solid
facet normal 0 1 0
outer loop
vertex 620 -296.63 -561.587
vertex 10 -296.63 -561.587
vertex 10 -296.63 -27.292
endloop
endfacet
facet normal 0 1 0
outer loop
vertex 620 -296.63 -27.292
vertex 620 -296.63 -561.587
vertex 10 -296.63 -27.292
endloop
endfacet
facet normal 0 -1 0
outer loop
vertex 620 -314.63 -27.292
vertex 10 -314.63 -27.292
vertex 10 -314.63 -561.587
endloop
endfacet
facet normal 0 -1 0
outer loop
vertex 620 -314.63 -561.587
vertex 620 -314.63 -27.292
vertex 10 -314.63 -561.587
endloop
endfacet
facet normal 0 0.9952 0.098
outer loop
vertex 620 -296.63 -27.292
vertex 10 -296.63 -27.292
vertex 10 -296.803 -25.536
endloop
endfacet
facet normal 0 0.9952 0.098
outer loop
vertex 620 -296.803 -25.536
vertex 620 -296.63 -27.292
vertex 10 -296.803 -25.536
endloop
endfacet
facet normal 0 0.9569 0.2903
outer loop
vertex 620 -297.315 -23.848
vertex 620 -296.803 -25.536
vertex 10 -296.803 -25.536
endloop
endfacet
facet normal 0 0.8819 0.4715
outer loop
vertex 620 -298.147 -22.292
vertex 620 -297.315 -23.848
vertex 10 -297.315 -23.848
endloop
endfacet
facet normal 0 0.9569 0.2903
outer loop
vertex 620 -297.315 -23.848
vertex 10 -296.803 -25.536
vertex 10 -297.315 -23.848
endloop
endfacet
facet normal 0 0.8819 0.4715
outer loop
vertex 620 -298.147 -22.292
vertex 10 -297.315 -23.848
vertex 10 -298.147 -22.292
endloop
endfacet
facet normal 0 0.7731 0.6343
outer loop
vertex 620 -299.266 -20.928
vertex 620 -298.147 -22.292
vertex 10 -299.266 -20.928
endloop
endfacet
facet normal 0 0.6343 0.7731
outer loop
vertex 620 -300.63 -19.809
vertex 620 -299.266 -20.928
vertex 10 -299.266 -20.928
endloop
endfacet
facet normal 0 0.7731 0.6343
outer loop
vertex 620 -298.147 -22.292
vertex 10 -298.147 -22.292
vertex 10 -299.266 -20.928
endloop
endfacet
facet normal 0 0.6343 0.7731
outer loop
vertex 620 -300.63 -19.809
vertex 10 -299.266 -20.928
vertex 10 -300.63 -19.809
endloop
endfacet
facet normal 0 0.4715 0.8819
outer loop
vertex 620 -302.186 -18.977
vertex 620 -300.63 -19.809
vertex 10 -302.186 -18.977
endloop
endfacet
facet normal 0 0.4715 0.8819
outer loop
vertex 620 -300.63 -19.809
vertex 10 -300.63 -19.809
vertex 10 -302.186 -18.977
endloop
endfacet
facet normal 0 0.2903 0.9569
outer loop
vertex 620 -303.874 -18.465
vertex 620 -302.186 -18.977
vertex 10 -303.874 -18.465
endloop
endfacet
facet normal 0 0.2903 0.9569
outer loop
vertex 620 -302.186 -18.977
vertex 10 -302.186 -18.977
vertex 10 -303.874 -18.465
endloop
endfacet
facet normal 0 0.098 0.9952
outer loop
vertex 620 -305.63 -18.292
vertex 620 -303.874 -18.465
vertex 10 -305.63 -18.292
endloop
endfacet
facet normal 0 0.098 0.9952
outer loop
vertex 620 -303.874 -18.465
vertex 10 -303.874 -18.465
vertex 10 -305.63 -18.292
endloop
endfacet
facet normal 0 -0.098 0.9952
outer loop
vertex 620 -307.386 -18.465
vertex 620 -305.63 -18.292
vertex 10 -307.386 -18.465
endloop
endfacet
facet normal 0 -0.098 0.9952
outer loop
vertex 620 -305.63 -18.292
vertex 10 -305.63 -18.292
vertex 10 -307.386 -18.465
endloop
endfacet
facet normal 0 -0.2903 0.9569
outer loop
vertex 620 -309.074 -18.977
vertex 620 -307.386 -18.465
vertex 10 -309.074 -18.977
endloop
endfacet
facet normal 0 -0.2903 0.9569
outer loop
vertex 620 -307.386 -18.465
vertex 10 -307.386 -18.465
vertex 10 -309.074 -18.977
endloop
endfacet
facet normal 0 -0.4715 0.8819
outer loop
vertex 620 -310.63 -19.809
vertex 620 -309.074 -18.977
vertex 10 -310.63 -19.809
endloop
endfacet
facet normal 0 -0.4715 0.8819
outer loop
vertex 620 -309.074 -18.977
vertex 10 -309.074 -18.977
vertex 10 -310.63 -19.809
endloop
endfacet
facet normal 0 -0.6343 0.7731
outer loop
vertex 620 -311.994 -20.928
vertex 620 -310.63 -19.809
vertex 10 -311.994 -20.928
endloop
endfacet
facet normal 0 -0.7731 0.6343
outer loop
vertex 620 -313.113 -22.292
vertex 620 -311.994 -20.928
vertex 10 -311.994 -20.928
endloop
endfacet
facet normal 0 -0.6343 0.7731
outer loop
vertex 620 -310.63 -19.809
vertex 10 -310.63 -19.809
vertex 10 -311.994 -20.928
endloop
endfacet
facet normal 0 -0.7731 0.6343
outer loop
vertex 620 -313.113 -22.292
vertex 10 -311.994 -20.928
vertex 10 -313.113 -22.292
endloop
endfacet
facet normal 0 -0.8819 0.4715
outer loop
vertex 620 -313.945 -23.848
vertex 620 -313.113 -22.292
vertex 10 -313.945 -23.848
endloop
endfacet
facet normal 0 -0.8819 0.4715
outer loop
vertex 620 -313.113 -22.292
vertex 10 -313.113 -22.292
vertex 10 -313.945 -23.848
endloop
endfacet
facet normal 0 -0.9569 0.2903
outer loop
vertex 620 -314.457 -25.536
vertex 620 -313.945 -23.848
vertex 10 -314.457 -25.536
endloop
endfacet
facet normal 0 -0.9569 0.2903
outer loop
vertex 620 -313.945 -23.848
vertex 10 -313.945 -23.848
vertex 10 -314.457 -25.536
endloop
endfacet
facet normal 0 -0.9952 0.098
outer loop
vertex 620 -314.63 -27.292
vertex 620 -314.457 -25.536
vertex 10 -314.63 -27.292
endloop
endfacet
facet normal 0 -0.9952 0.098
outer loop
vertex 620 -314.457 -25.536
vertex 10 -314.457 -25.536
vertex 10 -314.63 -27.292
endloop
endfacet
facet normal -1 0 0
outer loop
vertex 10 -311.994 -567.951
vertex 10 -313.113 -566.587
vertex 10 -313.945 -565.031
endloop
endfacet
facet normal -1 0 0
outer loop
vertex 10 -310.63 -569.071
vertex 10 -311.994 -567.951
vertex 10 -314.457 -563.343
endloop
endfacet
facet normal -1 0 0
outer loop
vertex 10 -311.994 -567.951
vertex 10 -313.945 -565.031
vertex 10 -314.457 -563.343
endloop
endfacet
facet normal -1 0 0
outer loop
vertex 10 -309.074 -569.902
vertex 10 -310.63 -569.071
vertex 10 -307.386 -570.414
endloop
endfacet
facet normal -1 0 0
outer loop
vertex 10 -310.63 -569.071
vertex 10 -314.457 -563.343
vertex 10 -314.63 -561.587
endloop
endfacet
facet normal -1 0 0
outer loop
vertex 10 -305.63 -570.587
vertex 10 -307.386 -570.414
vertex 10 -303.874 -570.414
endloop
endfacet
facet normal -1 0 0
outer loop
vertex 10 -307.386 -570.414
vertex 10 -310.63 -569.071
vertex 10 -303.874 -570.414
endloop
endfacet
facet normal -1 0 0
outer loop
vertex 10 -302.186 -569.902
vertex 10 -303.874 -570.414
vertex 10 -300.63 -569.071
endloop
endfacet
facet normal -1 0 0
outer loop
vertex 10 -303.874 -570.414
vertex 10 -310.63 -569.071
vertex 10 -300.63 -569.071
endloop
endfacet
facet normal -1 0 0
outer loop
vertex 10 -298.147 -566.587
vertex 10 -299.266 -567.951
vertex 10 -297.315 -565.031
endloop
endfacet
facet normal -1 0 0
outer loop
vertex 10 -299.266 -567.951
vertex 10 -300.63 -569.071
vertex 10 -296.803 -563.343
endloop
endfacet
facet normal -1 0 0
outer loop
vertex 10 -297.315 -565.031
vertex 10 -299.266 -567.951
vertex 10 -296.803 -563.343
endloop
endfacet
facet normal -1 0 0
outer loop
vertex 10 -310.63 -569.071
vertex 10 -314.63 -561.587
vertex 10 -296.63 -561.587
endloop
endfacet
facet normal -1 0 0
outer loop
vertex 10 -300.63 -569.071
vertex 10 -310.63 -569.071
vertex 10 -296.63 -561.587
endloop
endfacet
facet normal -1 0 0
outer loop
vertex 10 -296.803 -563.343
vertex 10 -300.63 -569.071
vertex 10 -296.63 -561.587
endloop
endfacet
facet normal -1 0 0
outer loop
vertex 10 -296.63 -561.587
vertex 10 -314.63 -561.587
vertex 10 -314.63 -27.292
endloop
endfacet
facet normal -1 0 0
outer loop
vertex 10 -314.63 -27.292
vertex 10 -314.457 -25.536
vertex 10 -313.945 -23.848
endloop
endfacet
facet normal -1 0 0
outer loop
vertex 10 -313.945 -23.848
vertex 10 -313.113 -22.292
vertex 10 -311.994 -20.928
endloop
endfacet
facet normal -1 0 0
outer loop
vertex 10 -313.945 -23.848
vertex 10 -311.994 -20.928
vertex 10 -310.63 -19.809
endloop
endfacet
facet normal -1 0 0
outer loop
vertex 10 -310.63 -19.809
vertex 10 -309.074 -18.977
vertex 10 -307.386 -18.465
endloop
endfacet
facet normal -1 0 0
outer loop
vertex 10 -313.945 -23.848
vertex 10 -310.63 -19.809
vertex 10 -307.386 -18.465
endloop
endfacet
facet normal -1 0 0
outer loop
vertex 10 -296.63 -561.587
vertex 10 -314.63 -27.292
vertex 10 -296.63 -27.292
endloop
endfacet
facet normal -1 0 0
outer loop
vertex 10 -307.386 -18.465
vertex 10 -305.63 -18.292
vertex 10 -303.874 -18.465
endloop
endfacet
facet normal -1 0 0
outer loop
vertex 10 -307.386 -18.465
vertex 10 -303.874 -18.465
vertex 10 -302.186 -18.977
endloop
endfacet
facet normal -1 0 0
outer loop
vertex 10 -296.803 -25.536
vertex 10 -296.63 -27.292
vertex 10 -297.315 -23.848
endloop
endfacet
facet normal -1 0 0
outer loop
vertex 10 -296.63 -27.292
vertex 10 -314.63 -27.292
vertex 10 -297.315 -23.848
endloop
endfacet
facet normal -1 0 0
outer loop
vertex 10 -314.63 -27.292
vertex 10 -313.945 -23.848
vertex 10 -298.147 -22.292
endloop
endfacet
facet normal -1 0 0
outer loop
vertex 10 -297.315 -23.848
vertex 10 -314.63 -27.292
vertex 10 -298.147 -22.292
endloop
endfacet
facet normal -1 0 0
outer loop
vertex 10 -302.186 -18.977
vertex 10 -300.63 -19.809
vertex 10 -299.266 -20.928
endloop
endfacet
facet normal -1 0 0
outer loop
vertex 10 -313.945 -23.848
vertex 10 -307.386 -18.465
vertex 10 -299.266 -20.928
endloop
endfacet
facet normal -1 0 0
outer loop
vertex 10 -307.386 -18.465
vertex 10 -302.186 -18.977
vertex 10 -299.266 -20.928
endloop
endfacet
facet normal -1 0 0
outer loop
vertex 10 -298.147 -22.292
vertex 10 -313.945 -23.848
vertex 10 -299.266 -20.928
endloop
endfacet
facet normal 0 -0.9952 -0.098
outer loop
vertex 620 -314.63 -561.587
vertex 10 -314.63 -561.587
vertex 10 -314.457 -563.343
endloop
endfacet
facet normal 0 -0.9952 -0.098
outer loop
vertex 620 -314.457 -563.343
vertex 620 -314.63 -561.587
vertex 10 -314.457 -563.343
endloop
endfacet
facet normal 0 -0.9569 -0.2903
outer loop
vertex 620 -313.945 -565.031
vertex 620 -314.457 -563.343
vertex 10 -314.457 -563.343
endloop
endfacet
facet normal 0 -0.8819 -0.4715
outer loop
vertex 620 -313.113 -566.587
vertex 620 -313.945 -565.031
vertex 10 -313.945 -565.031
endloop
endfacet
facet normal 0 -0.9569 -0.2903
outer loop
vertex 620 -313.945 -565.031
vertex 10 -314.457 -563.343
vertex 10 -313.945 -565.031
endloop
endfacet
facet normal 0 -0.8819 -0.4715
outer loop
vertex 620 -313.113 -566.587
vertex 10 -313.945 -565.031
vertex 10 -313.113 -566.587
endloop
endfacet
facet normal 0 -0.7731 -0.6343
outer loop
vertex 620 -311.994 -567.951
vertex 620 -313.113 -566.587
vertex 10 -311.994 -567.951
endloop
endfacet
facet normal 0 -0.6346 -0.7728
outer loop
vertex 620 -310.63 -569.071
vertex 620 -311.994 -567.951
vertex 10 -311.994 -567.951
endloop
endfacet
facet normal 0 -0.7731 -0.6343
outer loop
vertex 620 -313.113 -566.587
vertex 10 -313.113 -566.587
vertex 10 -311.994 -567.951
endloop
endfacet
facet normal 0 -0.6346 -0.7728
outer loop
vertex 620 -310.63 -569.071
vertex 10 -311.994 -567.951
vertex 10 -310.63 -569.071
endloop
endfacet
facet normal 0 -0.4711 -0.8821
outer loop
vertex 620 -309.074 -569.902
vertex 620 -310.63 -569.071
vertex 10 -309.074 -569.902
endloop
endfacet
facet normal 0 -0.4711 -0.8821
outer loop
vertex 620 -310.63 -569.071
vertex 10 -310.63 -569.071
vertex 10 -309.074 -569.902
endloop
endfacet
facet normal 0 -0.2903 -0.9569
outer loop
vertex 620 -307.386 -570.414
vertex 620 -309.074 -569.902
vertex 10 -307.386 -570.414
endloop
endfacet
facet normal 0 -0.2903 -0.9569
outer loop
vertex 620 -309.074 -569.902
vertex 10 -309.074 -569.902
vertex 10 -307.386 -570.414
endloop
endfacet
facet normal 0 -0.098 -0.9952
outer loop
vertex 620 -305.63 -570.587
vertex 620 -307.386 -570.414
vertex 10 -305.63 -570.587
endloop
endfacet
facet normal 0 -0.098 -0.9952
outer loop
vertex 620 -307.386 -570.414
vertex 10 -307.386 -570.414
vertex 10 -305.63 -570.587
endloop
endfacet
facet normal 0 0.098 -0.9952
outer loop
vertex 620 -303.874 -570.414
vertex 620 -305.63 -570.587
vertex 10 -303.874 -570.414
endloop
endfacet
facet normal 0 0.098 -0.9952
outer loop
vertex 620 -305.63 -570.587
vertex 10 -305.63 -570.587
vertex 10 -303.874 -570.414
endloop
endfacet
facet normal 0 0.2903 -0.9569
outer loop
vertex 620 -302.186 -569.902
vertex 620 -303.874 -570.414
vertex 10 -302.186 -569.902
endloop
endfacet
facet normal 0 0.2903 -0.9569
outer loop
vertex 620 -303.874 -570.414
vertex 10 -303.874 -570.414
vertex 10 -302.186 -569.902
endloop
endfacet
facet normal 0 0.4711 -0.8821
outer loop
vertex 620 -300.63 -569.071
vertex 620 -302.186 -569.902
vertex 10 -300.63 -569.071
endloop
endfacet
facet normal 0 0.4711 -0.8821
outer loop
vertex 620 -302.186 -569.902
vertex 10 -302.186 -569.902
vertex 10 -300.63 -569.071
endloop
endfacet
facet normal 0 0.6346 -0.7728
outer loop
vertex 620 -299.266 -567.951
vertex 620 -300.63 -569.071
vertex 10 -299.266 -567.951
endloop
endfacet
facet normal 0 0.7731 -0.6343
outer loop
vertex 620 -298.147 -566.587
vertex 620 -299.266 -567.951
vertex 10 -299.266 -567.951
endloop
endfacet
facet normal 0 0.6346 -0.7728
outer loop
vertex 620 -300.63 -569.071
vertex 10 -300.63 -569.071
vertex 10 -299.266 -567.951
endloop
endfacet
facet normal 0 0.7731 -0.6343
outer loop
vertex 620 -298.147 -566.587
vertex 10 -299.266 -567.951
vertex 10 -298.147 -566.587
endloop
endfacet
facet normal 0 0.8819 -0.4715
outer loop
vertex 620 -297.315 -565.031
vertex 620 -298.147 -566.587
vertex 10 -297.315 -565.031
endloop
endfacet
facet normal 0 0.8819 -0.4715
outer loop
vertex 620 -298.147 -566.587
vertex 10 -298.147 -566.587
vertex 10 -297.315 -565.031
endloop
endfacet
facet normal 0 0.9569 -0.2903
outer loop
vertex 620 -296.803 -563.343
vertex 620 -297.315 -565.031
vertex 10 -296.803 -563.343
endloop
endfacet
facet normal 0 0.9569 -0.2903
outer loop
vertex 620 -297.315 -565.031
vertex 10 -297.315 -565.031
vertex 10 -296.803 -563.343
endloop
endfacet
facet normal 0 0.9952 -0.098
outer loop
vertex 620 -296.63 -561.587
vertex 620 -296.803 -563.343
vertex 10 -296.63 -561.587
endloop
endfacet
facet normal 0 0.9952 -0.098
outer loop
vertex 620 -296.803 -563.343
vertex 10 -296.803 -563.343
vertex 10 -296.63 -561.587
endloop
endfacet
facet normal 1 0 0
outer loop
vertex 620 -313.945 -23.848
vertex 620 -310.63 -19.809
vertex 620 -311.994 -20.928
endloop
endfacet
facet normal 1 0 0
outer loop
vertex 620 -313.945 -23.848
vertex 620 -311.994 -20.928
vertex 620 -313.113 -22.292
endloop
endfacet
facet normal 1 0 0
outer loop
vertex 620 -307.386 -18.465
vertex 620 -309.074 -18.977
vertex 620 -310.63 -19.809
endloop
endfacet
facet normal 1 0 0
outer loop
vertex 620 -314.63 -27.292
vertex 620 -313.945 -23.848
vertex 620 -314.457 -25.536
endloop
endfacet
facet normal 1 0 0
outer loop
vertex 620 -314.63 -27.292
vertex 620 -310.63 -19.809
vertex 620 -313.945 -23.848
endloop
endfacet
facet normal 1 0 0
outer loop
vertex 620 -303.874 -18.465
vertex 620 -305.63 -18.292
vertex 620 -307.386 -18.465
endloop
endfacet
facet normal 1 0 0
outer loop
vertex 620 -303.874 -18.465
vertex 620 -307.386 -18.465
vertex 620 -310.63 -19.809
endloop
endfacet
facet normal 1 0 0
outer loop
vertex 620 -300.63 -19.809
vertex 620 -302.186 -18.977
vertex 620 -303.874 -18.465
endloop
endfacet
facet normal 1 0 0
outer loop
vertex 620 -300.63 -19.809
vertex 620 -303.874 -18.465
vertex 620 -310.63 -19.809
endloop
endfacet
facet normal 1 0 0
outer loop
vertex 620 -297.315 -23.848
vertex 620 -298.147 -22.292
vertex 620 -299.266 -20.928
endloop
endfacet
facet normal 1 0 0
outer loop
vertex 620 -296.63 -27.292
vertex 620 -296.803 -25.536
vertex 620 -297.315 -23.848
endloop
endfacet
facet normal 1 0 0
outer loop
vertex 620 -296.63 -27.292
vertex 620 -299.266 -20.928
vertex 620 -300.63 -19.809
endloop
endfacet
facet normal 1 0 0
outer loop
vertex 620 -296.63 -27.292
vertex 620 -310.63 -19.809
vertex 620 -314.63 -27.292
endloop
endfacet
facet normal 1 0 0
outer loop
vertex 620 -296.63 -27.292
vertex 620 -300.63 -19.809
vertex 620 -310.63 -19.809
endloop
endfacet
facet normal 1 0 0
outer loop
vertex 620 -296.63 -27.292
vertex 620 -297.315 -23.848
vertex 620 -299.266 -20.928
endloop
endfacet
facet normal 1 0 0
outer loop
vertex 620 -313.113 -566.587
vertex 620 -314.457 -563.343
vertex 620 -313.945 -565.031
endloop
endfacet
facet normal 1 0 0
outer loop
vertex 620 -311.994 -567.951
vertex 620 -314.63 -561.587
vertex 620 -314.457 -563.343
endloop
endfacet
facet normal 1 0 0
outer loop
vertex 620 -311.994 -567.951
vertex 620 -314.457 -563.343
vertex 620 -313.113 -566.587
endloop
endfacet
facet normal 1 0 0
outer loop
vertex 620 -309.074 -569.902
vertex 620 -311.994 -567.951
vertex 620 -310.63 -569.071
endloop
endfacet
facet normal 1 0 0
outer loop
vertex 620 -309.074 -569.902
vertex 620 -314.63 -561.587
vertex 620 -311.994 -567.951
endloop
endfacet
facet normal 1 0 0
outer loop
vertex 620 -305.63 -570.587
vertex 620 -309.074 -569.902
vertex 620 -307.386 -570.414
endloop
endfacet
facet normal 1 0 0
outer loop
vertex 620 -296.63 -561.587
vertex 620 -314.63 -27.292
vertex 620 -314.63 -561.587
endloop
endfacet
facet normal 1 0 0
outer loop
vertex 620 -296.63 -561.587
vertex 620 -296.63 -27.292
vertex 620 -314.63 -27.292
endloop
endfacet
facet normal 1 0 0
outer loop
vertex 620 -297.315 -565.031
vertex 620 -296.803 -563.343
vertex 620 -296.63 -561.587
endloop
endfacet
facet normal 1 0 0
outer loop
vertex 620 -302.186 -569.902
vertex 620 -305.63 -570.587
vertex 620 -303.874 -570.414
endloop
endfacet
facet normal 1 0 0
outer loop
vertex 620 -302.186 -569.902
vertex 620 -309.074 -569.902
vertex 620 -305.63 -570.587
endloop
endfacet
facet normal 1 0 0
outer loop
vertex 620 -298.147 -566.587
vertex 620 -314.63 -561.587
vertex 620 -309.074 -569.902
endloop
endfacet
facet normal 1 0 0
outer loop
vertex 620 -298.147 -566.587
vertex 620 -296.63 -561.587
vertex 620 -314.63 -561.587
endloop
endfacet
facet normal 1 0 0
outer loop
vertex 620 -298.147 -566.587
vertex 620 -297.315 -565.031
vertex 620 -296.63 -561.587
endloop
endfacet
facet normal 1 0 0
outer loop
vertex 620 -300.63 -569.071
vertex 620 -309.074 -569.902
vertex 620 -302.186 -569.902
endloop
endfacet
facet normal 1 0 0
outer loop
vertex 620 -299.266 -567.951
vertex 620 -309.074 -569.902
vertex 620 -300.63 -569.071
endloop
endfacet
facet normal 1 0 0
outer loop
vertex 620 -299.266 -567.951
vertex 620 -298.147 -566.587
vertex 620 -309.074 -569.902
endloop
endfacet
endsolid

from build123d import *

# Parameters (mm, degrees)
BOSS_EXTRUDE1_DEPTH = 10
CUT_EXTRUDE4_DEPTH  = 3
BOSS_EXTRUDE2_DEPTH = 610
SPLIT1_DEPTH        = 10


# Read off the part's stored shape, not the designer's step: Split1
with BuildPart() as part:
    # Sketch1 → Boss-Extrude1 (new body)
    with BuildSketch(Plane(origin=(0, 0, 0), x_dir=(0, 0, -1), z_dir=(1, 0, 0))):
        with BuildLine():
            Line((0, -14.281480067), (0, -294.281480067))
            ThreePointArc((0, -294.281480067), (8.786796564, -315.494683503), (30, -324.281480067))
            Line((30, -324.281480067), (573.815572472, -324.281480067))
            ThreePointArc((573.815572472, -324.281480067), (580.886640283, -321.352547879), (583.815572472, -314.281480067))
            Line((583.815572472, -314.281480067), (583.815572472, -219.493566063))
            ThreePointArc((583.815572472, -219.493566063), (582.007092914, -213.757801699), (577.235773905, -210.096639855))
            Line((577.235773905, -210.096639855), (13.420201433, -4.88455386))
            ThreePointArc((13.420201433, -4.88455386), (4.264235636, -6.089959625), (0, -14.281480067))
        make_face()
    extrude(amount=BOSS_EXTRUDE1_DEPTH)

    # Sketch3 → Cut-Extrude4 (cut)
    with BuildSketch(Plane.ZY):
        with BuildLine():
            ThreePointArc((-23.162175785, -218.017297737), (-17.576945532, -207.678107035), (-26.738120061, -200.318314743))
            add(Edge.make_bspline(
                [(-26.738120061, -200.318314743), (-45.914354434, -200.660753587), (-151.32107334, -255.510398156), (-414.880335601, -286.385074175), (-542.431128002, -257.731725159), (-546.154906269, -257.731029979)],
                knots=[0, 0, 0, 0, 0.560935224, 0.660935224, 1, 1, 1, 1], degree=3))
            ThreePointArc((-546.154906269, -257.731029979), (-563.288388976, -273.27487263), (-549.474047026, -291.831036849))
            add(Edge.make_bspline(
                [(-549.474047026, -291.831036849), (-474.750080899, -306.502271197), (-284.669923623, -324.572171749), (-143.080818041, -266.034178467), (-23.162175785, -218.017297737)],
                knots=[0, 0, 0, 0, 0.423888314, 1, 1, 1, 1], degree=3))
        make_face()
        with BuildLine():
            ThreePointArc((-26.950185671, -47.737214996), (-28.17113687, -40.715672082), (-35.124917897, -39.154353359))
            add(Edge.make_bspline(
                [(-35.124917897, -39.154353359), (-50.602952828, -45.122445935), (-99.042539, -170.661871263), (-331.224003862, -171.181746235), (-353.169530365, -171.181734297)],
                knots=[0, 0, 0, 0, 0.639195597, 1, 1, 1, 1], degree=3))
            ThreePointArc((-353.169530365, -171.181734297), (-370.309371751, -186.812434708), (-356.32010769, -205.316311305))
            add(Edge.make_bspline(
                [(-356.32010769, -205.316311305), (-352.838937223, -205.964445921), (-121.396454164, -217.989087479), (-35.312726243, -66.629555086), (-26.950185671, -47.737214996)],
                knots=[0, 0, 0, 0, 0.40968467, 1, 1, 1, 1], degree=3))
        make_face()
    extrude(amount=-CUT_EXTRUDE4_DEPTH, mode=Mode.SUBTRACT)

    # Sketch5 → Boss-Extrude2 (add)
    with BuildSketch(Plane(origin=(10, 0, 0), x_dir=(0, 0, -1), z_dir=(1, 0, 0))):
        with BuildLine():
            Line((561.587294138, -296.630106089), (27.291979273, -296.630106089))
            ThreePointArc((27.291979273, -296.630106089), (18.291979273, -305.630106089), (27.291979273, -314.630106089))
            Line((27.291979273, -314.630106089), (561.587294138, -314.630106089))
            ThreePointArc((561.587294138, -314.630106089), (570.587294138, -305.630106089), (561.587294138, -296.630106089))
        make_face()
    extrude(amount=BOSS_EXTRUDE2_DEPTH)

    # Split1 outline → Split1 (cut)
    # profile 1 of 3: a face of its own
    with BuildSketch(Plane.YZ):
        with BuildLine():
            ThreePointArc((-294.281480067, 0), (-315.494683503, -8.786796564), (-324.281480067, -30))
            Line((-324.281480067, -30), (-324.281480067, -573.815572472))
            ThreePointArc((-324.281480067, -573.815572472), (-321.352547879, -580.886640284), (-314.281480067, -583.815572472))
            Line((-314.281480067, -583.815572472), (-219.493566063, -583.815572472))
            ThreePointArc((-219.493566063, -583.815572472), (-213.7578017, -582.007092914), (-210.096639855, -577.235773905))
            Line((-210.096639855, -577.235773905), (-4.88455386, -13.420201433))
            ThreePointArc((-4.88455386, -13.420201433), (-6.089959625, -4.264235637), (-14.281480067, 0))
            Line((-14.281480067, 0), (-294.281480067, 0))
        make_face()
        with BuildLine():
            ThreePointArc((-257.731029979, -546.154906269), (-273.27487263, -563.288388976), (-291.831036849, -549.474047026))
            add(Edge.make_bspline(
                [(-291.831036849, -549.474047026), (-306.502271197, -474.750080899), (-324.572171749, -284.669923623), (-266.034178467, -143.080818041), (-218.017297737, -23.162175785)],
                knots=[0, 0, 0, 0, 0.423888314, 1, 1, 1, 1], degree=3))
            ThreePointArc((-218.017297737, -23.162175785), (-207.678107036, -17.576945532), (-200.318314743, -26.738120061))
            add(Edge.make_bspline(
                [(-200.318314743, -26.738120061), (-200.660753587, -45.914354434), (-255.510398156, -151.32107334), (-286.385074175, -414.880335601), (-257.731725159, -542.431128002), (-257.731029979, -546.154906269)],
                knots=[0, 0, 0, 0, 0.560935224, 0.660935224, 1, 1, 1, 1], degree=3))
        make_face(mode=Mode.SUBTRACT)
        with BuildLine():
            ThreePointArc((-171.181734297, -353.169530365), (-186.812434708, -370.309371751), (-205.316311305, -356.32010769))
            add(Edge.make_bspline(
                [(-205.316311305, -356.32010769), (-205.964445921, -352.838937223), (-217.989087479, -121.396454164), (-66.629555086, -35.312726243), (-47.737214996, -26.950185671)],
                knots=[0, 0, 0, 0, 0.40968467, 1, 1, 1, 1], degree=3))
            ThreePointArc((-47.737214996, -26.950185671), (-40.715672082, -28.17113687), (-39.154353359, -35.124917897))
            add(Edge.make_bspline(
                [(-39.154353359, -35.124917897), (-45.122445935, -50.602952828), (-170.661871263, -99.042539), (-171.181746235, -331.224003862), (-171.181734297, -353.169530365)],
                knots=[0, 0, 0, 0, 0.639195597, 1, 1, 1, 1], degree=3))
        make_face(mode=Mode.SUBTRACT)
    # profile 2 of 3: a face of its own
    with BuildSketch(Plane.YZ):
        with BuildLine():
            add(Edge.make_bspline(
                [(-205.316311305, -356.32010769), (-205.964445921, -352.838937223), (-217.989087479, -121.396454164), (-66.629555086, -35.312726243), (-47.737214996, -26.950185671)],
                knots=[0, 0, 0, 0, 0.40968467, 1, 1, 1, 1], degree=3))
            ThreePointArc((-205.316311305, -356.32010769), (-186.812434708, -370.309371751), (-171.181734297, -353.169530365))
            add(Edge.make_bspline(
                [(-39.154353359, -35.124917897), (-45.122445935, -50.602952828), (-170.661871263, -99.042539), (-171.181746235, -331.224003862), (-171.181734297, -353.169530365)],
                knots=[0, 0, 0, 0, 0.639195597, 1, 1, 1, 1], degree=3))
            ThreePointArc((-39.154353359, -35.124917897), (-40.715672082, -28.17113687), (-47.737214996, -26.950185671))
        make_face()
    # profile 3 of 3: a face of its own
    with BuildSketch(Plane.YZ):
        with BuildLine():
            add(Edge.make_bspline(
                [(-291.831036849, -549.474047026), (-306.502271197, -474.750080899), (-324.572171749, -284.669923623), (-266.034178467, -143.080818041), (-218.017297737, -23.162175785)],
                knots=[0, 0, 0, 0, 0.423888314, 1, 1, 1, 1], degree=3))
            ThreePointArc((-291.831036849, -549.474047026), (-273.27487263, -563.288388976), (-257.731029979, -546.154906269))
            add(Edge.make_bspline(
                [(-200.318314743, -26.738120061), (-200.660753587, -45.914354434), (-255.510398156, -151.32107334), (-286.385074175, -414.880335601), (-257.731725159, -542.431128002), (-257.731029979, -546.154906269)],
                knots=[0, 0, 0, 0, 0.560935224, 0.660935224, 1, 1, 1, 1], degree=3))
            ThreePointArc((-200.318314743, -26.738120061), (-207.678107036, -17.576945532), (-218.017297737, -23.162175785))
        make_face()
    extrude(amount=SPLIT1_DEPTH, mode=Mode.SUBTRACT)


solid = part.part
